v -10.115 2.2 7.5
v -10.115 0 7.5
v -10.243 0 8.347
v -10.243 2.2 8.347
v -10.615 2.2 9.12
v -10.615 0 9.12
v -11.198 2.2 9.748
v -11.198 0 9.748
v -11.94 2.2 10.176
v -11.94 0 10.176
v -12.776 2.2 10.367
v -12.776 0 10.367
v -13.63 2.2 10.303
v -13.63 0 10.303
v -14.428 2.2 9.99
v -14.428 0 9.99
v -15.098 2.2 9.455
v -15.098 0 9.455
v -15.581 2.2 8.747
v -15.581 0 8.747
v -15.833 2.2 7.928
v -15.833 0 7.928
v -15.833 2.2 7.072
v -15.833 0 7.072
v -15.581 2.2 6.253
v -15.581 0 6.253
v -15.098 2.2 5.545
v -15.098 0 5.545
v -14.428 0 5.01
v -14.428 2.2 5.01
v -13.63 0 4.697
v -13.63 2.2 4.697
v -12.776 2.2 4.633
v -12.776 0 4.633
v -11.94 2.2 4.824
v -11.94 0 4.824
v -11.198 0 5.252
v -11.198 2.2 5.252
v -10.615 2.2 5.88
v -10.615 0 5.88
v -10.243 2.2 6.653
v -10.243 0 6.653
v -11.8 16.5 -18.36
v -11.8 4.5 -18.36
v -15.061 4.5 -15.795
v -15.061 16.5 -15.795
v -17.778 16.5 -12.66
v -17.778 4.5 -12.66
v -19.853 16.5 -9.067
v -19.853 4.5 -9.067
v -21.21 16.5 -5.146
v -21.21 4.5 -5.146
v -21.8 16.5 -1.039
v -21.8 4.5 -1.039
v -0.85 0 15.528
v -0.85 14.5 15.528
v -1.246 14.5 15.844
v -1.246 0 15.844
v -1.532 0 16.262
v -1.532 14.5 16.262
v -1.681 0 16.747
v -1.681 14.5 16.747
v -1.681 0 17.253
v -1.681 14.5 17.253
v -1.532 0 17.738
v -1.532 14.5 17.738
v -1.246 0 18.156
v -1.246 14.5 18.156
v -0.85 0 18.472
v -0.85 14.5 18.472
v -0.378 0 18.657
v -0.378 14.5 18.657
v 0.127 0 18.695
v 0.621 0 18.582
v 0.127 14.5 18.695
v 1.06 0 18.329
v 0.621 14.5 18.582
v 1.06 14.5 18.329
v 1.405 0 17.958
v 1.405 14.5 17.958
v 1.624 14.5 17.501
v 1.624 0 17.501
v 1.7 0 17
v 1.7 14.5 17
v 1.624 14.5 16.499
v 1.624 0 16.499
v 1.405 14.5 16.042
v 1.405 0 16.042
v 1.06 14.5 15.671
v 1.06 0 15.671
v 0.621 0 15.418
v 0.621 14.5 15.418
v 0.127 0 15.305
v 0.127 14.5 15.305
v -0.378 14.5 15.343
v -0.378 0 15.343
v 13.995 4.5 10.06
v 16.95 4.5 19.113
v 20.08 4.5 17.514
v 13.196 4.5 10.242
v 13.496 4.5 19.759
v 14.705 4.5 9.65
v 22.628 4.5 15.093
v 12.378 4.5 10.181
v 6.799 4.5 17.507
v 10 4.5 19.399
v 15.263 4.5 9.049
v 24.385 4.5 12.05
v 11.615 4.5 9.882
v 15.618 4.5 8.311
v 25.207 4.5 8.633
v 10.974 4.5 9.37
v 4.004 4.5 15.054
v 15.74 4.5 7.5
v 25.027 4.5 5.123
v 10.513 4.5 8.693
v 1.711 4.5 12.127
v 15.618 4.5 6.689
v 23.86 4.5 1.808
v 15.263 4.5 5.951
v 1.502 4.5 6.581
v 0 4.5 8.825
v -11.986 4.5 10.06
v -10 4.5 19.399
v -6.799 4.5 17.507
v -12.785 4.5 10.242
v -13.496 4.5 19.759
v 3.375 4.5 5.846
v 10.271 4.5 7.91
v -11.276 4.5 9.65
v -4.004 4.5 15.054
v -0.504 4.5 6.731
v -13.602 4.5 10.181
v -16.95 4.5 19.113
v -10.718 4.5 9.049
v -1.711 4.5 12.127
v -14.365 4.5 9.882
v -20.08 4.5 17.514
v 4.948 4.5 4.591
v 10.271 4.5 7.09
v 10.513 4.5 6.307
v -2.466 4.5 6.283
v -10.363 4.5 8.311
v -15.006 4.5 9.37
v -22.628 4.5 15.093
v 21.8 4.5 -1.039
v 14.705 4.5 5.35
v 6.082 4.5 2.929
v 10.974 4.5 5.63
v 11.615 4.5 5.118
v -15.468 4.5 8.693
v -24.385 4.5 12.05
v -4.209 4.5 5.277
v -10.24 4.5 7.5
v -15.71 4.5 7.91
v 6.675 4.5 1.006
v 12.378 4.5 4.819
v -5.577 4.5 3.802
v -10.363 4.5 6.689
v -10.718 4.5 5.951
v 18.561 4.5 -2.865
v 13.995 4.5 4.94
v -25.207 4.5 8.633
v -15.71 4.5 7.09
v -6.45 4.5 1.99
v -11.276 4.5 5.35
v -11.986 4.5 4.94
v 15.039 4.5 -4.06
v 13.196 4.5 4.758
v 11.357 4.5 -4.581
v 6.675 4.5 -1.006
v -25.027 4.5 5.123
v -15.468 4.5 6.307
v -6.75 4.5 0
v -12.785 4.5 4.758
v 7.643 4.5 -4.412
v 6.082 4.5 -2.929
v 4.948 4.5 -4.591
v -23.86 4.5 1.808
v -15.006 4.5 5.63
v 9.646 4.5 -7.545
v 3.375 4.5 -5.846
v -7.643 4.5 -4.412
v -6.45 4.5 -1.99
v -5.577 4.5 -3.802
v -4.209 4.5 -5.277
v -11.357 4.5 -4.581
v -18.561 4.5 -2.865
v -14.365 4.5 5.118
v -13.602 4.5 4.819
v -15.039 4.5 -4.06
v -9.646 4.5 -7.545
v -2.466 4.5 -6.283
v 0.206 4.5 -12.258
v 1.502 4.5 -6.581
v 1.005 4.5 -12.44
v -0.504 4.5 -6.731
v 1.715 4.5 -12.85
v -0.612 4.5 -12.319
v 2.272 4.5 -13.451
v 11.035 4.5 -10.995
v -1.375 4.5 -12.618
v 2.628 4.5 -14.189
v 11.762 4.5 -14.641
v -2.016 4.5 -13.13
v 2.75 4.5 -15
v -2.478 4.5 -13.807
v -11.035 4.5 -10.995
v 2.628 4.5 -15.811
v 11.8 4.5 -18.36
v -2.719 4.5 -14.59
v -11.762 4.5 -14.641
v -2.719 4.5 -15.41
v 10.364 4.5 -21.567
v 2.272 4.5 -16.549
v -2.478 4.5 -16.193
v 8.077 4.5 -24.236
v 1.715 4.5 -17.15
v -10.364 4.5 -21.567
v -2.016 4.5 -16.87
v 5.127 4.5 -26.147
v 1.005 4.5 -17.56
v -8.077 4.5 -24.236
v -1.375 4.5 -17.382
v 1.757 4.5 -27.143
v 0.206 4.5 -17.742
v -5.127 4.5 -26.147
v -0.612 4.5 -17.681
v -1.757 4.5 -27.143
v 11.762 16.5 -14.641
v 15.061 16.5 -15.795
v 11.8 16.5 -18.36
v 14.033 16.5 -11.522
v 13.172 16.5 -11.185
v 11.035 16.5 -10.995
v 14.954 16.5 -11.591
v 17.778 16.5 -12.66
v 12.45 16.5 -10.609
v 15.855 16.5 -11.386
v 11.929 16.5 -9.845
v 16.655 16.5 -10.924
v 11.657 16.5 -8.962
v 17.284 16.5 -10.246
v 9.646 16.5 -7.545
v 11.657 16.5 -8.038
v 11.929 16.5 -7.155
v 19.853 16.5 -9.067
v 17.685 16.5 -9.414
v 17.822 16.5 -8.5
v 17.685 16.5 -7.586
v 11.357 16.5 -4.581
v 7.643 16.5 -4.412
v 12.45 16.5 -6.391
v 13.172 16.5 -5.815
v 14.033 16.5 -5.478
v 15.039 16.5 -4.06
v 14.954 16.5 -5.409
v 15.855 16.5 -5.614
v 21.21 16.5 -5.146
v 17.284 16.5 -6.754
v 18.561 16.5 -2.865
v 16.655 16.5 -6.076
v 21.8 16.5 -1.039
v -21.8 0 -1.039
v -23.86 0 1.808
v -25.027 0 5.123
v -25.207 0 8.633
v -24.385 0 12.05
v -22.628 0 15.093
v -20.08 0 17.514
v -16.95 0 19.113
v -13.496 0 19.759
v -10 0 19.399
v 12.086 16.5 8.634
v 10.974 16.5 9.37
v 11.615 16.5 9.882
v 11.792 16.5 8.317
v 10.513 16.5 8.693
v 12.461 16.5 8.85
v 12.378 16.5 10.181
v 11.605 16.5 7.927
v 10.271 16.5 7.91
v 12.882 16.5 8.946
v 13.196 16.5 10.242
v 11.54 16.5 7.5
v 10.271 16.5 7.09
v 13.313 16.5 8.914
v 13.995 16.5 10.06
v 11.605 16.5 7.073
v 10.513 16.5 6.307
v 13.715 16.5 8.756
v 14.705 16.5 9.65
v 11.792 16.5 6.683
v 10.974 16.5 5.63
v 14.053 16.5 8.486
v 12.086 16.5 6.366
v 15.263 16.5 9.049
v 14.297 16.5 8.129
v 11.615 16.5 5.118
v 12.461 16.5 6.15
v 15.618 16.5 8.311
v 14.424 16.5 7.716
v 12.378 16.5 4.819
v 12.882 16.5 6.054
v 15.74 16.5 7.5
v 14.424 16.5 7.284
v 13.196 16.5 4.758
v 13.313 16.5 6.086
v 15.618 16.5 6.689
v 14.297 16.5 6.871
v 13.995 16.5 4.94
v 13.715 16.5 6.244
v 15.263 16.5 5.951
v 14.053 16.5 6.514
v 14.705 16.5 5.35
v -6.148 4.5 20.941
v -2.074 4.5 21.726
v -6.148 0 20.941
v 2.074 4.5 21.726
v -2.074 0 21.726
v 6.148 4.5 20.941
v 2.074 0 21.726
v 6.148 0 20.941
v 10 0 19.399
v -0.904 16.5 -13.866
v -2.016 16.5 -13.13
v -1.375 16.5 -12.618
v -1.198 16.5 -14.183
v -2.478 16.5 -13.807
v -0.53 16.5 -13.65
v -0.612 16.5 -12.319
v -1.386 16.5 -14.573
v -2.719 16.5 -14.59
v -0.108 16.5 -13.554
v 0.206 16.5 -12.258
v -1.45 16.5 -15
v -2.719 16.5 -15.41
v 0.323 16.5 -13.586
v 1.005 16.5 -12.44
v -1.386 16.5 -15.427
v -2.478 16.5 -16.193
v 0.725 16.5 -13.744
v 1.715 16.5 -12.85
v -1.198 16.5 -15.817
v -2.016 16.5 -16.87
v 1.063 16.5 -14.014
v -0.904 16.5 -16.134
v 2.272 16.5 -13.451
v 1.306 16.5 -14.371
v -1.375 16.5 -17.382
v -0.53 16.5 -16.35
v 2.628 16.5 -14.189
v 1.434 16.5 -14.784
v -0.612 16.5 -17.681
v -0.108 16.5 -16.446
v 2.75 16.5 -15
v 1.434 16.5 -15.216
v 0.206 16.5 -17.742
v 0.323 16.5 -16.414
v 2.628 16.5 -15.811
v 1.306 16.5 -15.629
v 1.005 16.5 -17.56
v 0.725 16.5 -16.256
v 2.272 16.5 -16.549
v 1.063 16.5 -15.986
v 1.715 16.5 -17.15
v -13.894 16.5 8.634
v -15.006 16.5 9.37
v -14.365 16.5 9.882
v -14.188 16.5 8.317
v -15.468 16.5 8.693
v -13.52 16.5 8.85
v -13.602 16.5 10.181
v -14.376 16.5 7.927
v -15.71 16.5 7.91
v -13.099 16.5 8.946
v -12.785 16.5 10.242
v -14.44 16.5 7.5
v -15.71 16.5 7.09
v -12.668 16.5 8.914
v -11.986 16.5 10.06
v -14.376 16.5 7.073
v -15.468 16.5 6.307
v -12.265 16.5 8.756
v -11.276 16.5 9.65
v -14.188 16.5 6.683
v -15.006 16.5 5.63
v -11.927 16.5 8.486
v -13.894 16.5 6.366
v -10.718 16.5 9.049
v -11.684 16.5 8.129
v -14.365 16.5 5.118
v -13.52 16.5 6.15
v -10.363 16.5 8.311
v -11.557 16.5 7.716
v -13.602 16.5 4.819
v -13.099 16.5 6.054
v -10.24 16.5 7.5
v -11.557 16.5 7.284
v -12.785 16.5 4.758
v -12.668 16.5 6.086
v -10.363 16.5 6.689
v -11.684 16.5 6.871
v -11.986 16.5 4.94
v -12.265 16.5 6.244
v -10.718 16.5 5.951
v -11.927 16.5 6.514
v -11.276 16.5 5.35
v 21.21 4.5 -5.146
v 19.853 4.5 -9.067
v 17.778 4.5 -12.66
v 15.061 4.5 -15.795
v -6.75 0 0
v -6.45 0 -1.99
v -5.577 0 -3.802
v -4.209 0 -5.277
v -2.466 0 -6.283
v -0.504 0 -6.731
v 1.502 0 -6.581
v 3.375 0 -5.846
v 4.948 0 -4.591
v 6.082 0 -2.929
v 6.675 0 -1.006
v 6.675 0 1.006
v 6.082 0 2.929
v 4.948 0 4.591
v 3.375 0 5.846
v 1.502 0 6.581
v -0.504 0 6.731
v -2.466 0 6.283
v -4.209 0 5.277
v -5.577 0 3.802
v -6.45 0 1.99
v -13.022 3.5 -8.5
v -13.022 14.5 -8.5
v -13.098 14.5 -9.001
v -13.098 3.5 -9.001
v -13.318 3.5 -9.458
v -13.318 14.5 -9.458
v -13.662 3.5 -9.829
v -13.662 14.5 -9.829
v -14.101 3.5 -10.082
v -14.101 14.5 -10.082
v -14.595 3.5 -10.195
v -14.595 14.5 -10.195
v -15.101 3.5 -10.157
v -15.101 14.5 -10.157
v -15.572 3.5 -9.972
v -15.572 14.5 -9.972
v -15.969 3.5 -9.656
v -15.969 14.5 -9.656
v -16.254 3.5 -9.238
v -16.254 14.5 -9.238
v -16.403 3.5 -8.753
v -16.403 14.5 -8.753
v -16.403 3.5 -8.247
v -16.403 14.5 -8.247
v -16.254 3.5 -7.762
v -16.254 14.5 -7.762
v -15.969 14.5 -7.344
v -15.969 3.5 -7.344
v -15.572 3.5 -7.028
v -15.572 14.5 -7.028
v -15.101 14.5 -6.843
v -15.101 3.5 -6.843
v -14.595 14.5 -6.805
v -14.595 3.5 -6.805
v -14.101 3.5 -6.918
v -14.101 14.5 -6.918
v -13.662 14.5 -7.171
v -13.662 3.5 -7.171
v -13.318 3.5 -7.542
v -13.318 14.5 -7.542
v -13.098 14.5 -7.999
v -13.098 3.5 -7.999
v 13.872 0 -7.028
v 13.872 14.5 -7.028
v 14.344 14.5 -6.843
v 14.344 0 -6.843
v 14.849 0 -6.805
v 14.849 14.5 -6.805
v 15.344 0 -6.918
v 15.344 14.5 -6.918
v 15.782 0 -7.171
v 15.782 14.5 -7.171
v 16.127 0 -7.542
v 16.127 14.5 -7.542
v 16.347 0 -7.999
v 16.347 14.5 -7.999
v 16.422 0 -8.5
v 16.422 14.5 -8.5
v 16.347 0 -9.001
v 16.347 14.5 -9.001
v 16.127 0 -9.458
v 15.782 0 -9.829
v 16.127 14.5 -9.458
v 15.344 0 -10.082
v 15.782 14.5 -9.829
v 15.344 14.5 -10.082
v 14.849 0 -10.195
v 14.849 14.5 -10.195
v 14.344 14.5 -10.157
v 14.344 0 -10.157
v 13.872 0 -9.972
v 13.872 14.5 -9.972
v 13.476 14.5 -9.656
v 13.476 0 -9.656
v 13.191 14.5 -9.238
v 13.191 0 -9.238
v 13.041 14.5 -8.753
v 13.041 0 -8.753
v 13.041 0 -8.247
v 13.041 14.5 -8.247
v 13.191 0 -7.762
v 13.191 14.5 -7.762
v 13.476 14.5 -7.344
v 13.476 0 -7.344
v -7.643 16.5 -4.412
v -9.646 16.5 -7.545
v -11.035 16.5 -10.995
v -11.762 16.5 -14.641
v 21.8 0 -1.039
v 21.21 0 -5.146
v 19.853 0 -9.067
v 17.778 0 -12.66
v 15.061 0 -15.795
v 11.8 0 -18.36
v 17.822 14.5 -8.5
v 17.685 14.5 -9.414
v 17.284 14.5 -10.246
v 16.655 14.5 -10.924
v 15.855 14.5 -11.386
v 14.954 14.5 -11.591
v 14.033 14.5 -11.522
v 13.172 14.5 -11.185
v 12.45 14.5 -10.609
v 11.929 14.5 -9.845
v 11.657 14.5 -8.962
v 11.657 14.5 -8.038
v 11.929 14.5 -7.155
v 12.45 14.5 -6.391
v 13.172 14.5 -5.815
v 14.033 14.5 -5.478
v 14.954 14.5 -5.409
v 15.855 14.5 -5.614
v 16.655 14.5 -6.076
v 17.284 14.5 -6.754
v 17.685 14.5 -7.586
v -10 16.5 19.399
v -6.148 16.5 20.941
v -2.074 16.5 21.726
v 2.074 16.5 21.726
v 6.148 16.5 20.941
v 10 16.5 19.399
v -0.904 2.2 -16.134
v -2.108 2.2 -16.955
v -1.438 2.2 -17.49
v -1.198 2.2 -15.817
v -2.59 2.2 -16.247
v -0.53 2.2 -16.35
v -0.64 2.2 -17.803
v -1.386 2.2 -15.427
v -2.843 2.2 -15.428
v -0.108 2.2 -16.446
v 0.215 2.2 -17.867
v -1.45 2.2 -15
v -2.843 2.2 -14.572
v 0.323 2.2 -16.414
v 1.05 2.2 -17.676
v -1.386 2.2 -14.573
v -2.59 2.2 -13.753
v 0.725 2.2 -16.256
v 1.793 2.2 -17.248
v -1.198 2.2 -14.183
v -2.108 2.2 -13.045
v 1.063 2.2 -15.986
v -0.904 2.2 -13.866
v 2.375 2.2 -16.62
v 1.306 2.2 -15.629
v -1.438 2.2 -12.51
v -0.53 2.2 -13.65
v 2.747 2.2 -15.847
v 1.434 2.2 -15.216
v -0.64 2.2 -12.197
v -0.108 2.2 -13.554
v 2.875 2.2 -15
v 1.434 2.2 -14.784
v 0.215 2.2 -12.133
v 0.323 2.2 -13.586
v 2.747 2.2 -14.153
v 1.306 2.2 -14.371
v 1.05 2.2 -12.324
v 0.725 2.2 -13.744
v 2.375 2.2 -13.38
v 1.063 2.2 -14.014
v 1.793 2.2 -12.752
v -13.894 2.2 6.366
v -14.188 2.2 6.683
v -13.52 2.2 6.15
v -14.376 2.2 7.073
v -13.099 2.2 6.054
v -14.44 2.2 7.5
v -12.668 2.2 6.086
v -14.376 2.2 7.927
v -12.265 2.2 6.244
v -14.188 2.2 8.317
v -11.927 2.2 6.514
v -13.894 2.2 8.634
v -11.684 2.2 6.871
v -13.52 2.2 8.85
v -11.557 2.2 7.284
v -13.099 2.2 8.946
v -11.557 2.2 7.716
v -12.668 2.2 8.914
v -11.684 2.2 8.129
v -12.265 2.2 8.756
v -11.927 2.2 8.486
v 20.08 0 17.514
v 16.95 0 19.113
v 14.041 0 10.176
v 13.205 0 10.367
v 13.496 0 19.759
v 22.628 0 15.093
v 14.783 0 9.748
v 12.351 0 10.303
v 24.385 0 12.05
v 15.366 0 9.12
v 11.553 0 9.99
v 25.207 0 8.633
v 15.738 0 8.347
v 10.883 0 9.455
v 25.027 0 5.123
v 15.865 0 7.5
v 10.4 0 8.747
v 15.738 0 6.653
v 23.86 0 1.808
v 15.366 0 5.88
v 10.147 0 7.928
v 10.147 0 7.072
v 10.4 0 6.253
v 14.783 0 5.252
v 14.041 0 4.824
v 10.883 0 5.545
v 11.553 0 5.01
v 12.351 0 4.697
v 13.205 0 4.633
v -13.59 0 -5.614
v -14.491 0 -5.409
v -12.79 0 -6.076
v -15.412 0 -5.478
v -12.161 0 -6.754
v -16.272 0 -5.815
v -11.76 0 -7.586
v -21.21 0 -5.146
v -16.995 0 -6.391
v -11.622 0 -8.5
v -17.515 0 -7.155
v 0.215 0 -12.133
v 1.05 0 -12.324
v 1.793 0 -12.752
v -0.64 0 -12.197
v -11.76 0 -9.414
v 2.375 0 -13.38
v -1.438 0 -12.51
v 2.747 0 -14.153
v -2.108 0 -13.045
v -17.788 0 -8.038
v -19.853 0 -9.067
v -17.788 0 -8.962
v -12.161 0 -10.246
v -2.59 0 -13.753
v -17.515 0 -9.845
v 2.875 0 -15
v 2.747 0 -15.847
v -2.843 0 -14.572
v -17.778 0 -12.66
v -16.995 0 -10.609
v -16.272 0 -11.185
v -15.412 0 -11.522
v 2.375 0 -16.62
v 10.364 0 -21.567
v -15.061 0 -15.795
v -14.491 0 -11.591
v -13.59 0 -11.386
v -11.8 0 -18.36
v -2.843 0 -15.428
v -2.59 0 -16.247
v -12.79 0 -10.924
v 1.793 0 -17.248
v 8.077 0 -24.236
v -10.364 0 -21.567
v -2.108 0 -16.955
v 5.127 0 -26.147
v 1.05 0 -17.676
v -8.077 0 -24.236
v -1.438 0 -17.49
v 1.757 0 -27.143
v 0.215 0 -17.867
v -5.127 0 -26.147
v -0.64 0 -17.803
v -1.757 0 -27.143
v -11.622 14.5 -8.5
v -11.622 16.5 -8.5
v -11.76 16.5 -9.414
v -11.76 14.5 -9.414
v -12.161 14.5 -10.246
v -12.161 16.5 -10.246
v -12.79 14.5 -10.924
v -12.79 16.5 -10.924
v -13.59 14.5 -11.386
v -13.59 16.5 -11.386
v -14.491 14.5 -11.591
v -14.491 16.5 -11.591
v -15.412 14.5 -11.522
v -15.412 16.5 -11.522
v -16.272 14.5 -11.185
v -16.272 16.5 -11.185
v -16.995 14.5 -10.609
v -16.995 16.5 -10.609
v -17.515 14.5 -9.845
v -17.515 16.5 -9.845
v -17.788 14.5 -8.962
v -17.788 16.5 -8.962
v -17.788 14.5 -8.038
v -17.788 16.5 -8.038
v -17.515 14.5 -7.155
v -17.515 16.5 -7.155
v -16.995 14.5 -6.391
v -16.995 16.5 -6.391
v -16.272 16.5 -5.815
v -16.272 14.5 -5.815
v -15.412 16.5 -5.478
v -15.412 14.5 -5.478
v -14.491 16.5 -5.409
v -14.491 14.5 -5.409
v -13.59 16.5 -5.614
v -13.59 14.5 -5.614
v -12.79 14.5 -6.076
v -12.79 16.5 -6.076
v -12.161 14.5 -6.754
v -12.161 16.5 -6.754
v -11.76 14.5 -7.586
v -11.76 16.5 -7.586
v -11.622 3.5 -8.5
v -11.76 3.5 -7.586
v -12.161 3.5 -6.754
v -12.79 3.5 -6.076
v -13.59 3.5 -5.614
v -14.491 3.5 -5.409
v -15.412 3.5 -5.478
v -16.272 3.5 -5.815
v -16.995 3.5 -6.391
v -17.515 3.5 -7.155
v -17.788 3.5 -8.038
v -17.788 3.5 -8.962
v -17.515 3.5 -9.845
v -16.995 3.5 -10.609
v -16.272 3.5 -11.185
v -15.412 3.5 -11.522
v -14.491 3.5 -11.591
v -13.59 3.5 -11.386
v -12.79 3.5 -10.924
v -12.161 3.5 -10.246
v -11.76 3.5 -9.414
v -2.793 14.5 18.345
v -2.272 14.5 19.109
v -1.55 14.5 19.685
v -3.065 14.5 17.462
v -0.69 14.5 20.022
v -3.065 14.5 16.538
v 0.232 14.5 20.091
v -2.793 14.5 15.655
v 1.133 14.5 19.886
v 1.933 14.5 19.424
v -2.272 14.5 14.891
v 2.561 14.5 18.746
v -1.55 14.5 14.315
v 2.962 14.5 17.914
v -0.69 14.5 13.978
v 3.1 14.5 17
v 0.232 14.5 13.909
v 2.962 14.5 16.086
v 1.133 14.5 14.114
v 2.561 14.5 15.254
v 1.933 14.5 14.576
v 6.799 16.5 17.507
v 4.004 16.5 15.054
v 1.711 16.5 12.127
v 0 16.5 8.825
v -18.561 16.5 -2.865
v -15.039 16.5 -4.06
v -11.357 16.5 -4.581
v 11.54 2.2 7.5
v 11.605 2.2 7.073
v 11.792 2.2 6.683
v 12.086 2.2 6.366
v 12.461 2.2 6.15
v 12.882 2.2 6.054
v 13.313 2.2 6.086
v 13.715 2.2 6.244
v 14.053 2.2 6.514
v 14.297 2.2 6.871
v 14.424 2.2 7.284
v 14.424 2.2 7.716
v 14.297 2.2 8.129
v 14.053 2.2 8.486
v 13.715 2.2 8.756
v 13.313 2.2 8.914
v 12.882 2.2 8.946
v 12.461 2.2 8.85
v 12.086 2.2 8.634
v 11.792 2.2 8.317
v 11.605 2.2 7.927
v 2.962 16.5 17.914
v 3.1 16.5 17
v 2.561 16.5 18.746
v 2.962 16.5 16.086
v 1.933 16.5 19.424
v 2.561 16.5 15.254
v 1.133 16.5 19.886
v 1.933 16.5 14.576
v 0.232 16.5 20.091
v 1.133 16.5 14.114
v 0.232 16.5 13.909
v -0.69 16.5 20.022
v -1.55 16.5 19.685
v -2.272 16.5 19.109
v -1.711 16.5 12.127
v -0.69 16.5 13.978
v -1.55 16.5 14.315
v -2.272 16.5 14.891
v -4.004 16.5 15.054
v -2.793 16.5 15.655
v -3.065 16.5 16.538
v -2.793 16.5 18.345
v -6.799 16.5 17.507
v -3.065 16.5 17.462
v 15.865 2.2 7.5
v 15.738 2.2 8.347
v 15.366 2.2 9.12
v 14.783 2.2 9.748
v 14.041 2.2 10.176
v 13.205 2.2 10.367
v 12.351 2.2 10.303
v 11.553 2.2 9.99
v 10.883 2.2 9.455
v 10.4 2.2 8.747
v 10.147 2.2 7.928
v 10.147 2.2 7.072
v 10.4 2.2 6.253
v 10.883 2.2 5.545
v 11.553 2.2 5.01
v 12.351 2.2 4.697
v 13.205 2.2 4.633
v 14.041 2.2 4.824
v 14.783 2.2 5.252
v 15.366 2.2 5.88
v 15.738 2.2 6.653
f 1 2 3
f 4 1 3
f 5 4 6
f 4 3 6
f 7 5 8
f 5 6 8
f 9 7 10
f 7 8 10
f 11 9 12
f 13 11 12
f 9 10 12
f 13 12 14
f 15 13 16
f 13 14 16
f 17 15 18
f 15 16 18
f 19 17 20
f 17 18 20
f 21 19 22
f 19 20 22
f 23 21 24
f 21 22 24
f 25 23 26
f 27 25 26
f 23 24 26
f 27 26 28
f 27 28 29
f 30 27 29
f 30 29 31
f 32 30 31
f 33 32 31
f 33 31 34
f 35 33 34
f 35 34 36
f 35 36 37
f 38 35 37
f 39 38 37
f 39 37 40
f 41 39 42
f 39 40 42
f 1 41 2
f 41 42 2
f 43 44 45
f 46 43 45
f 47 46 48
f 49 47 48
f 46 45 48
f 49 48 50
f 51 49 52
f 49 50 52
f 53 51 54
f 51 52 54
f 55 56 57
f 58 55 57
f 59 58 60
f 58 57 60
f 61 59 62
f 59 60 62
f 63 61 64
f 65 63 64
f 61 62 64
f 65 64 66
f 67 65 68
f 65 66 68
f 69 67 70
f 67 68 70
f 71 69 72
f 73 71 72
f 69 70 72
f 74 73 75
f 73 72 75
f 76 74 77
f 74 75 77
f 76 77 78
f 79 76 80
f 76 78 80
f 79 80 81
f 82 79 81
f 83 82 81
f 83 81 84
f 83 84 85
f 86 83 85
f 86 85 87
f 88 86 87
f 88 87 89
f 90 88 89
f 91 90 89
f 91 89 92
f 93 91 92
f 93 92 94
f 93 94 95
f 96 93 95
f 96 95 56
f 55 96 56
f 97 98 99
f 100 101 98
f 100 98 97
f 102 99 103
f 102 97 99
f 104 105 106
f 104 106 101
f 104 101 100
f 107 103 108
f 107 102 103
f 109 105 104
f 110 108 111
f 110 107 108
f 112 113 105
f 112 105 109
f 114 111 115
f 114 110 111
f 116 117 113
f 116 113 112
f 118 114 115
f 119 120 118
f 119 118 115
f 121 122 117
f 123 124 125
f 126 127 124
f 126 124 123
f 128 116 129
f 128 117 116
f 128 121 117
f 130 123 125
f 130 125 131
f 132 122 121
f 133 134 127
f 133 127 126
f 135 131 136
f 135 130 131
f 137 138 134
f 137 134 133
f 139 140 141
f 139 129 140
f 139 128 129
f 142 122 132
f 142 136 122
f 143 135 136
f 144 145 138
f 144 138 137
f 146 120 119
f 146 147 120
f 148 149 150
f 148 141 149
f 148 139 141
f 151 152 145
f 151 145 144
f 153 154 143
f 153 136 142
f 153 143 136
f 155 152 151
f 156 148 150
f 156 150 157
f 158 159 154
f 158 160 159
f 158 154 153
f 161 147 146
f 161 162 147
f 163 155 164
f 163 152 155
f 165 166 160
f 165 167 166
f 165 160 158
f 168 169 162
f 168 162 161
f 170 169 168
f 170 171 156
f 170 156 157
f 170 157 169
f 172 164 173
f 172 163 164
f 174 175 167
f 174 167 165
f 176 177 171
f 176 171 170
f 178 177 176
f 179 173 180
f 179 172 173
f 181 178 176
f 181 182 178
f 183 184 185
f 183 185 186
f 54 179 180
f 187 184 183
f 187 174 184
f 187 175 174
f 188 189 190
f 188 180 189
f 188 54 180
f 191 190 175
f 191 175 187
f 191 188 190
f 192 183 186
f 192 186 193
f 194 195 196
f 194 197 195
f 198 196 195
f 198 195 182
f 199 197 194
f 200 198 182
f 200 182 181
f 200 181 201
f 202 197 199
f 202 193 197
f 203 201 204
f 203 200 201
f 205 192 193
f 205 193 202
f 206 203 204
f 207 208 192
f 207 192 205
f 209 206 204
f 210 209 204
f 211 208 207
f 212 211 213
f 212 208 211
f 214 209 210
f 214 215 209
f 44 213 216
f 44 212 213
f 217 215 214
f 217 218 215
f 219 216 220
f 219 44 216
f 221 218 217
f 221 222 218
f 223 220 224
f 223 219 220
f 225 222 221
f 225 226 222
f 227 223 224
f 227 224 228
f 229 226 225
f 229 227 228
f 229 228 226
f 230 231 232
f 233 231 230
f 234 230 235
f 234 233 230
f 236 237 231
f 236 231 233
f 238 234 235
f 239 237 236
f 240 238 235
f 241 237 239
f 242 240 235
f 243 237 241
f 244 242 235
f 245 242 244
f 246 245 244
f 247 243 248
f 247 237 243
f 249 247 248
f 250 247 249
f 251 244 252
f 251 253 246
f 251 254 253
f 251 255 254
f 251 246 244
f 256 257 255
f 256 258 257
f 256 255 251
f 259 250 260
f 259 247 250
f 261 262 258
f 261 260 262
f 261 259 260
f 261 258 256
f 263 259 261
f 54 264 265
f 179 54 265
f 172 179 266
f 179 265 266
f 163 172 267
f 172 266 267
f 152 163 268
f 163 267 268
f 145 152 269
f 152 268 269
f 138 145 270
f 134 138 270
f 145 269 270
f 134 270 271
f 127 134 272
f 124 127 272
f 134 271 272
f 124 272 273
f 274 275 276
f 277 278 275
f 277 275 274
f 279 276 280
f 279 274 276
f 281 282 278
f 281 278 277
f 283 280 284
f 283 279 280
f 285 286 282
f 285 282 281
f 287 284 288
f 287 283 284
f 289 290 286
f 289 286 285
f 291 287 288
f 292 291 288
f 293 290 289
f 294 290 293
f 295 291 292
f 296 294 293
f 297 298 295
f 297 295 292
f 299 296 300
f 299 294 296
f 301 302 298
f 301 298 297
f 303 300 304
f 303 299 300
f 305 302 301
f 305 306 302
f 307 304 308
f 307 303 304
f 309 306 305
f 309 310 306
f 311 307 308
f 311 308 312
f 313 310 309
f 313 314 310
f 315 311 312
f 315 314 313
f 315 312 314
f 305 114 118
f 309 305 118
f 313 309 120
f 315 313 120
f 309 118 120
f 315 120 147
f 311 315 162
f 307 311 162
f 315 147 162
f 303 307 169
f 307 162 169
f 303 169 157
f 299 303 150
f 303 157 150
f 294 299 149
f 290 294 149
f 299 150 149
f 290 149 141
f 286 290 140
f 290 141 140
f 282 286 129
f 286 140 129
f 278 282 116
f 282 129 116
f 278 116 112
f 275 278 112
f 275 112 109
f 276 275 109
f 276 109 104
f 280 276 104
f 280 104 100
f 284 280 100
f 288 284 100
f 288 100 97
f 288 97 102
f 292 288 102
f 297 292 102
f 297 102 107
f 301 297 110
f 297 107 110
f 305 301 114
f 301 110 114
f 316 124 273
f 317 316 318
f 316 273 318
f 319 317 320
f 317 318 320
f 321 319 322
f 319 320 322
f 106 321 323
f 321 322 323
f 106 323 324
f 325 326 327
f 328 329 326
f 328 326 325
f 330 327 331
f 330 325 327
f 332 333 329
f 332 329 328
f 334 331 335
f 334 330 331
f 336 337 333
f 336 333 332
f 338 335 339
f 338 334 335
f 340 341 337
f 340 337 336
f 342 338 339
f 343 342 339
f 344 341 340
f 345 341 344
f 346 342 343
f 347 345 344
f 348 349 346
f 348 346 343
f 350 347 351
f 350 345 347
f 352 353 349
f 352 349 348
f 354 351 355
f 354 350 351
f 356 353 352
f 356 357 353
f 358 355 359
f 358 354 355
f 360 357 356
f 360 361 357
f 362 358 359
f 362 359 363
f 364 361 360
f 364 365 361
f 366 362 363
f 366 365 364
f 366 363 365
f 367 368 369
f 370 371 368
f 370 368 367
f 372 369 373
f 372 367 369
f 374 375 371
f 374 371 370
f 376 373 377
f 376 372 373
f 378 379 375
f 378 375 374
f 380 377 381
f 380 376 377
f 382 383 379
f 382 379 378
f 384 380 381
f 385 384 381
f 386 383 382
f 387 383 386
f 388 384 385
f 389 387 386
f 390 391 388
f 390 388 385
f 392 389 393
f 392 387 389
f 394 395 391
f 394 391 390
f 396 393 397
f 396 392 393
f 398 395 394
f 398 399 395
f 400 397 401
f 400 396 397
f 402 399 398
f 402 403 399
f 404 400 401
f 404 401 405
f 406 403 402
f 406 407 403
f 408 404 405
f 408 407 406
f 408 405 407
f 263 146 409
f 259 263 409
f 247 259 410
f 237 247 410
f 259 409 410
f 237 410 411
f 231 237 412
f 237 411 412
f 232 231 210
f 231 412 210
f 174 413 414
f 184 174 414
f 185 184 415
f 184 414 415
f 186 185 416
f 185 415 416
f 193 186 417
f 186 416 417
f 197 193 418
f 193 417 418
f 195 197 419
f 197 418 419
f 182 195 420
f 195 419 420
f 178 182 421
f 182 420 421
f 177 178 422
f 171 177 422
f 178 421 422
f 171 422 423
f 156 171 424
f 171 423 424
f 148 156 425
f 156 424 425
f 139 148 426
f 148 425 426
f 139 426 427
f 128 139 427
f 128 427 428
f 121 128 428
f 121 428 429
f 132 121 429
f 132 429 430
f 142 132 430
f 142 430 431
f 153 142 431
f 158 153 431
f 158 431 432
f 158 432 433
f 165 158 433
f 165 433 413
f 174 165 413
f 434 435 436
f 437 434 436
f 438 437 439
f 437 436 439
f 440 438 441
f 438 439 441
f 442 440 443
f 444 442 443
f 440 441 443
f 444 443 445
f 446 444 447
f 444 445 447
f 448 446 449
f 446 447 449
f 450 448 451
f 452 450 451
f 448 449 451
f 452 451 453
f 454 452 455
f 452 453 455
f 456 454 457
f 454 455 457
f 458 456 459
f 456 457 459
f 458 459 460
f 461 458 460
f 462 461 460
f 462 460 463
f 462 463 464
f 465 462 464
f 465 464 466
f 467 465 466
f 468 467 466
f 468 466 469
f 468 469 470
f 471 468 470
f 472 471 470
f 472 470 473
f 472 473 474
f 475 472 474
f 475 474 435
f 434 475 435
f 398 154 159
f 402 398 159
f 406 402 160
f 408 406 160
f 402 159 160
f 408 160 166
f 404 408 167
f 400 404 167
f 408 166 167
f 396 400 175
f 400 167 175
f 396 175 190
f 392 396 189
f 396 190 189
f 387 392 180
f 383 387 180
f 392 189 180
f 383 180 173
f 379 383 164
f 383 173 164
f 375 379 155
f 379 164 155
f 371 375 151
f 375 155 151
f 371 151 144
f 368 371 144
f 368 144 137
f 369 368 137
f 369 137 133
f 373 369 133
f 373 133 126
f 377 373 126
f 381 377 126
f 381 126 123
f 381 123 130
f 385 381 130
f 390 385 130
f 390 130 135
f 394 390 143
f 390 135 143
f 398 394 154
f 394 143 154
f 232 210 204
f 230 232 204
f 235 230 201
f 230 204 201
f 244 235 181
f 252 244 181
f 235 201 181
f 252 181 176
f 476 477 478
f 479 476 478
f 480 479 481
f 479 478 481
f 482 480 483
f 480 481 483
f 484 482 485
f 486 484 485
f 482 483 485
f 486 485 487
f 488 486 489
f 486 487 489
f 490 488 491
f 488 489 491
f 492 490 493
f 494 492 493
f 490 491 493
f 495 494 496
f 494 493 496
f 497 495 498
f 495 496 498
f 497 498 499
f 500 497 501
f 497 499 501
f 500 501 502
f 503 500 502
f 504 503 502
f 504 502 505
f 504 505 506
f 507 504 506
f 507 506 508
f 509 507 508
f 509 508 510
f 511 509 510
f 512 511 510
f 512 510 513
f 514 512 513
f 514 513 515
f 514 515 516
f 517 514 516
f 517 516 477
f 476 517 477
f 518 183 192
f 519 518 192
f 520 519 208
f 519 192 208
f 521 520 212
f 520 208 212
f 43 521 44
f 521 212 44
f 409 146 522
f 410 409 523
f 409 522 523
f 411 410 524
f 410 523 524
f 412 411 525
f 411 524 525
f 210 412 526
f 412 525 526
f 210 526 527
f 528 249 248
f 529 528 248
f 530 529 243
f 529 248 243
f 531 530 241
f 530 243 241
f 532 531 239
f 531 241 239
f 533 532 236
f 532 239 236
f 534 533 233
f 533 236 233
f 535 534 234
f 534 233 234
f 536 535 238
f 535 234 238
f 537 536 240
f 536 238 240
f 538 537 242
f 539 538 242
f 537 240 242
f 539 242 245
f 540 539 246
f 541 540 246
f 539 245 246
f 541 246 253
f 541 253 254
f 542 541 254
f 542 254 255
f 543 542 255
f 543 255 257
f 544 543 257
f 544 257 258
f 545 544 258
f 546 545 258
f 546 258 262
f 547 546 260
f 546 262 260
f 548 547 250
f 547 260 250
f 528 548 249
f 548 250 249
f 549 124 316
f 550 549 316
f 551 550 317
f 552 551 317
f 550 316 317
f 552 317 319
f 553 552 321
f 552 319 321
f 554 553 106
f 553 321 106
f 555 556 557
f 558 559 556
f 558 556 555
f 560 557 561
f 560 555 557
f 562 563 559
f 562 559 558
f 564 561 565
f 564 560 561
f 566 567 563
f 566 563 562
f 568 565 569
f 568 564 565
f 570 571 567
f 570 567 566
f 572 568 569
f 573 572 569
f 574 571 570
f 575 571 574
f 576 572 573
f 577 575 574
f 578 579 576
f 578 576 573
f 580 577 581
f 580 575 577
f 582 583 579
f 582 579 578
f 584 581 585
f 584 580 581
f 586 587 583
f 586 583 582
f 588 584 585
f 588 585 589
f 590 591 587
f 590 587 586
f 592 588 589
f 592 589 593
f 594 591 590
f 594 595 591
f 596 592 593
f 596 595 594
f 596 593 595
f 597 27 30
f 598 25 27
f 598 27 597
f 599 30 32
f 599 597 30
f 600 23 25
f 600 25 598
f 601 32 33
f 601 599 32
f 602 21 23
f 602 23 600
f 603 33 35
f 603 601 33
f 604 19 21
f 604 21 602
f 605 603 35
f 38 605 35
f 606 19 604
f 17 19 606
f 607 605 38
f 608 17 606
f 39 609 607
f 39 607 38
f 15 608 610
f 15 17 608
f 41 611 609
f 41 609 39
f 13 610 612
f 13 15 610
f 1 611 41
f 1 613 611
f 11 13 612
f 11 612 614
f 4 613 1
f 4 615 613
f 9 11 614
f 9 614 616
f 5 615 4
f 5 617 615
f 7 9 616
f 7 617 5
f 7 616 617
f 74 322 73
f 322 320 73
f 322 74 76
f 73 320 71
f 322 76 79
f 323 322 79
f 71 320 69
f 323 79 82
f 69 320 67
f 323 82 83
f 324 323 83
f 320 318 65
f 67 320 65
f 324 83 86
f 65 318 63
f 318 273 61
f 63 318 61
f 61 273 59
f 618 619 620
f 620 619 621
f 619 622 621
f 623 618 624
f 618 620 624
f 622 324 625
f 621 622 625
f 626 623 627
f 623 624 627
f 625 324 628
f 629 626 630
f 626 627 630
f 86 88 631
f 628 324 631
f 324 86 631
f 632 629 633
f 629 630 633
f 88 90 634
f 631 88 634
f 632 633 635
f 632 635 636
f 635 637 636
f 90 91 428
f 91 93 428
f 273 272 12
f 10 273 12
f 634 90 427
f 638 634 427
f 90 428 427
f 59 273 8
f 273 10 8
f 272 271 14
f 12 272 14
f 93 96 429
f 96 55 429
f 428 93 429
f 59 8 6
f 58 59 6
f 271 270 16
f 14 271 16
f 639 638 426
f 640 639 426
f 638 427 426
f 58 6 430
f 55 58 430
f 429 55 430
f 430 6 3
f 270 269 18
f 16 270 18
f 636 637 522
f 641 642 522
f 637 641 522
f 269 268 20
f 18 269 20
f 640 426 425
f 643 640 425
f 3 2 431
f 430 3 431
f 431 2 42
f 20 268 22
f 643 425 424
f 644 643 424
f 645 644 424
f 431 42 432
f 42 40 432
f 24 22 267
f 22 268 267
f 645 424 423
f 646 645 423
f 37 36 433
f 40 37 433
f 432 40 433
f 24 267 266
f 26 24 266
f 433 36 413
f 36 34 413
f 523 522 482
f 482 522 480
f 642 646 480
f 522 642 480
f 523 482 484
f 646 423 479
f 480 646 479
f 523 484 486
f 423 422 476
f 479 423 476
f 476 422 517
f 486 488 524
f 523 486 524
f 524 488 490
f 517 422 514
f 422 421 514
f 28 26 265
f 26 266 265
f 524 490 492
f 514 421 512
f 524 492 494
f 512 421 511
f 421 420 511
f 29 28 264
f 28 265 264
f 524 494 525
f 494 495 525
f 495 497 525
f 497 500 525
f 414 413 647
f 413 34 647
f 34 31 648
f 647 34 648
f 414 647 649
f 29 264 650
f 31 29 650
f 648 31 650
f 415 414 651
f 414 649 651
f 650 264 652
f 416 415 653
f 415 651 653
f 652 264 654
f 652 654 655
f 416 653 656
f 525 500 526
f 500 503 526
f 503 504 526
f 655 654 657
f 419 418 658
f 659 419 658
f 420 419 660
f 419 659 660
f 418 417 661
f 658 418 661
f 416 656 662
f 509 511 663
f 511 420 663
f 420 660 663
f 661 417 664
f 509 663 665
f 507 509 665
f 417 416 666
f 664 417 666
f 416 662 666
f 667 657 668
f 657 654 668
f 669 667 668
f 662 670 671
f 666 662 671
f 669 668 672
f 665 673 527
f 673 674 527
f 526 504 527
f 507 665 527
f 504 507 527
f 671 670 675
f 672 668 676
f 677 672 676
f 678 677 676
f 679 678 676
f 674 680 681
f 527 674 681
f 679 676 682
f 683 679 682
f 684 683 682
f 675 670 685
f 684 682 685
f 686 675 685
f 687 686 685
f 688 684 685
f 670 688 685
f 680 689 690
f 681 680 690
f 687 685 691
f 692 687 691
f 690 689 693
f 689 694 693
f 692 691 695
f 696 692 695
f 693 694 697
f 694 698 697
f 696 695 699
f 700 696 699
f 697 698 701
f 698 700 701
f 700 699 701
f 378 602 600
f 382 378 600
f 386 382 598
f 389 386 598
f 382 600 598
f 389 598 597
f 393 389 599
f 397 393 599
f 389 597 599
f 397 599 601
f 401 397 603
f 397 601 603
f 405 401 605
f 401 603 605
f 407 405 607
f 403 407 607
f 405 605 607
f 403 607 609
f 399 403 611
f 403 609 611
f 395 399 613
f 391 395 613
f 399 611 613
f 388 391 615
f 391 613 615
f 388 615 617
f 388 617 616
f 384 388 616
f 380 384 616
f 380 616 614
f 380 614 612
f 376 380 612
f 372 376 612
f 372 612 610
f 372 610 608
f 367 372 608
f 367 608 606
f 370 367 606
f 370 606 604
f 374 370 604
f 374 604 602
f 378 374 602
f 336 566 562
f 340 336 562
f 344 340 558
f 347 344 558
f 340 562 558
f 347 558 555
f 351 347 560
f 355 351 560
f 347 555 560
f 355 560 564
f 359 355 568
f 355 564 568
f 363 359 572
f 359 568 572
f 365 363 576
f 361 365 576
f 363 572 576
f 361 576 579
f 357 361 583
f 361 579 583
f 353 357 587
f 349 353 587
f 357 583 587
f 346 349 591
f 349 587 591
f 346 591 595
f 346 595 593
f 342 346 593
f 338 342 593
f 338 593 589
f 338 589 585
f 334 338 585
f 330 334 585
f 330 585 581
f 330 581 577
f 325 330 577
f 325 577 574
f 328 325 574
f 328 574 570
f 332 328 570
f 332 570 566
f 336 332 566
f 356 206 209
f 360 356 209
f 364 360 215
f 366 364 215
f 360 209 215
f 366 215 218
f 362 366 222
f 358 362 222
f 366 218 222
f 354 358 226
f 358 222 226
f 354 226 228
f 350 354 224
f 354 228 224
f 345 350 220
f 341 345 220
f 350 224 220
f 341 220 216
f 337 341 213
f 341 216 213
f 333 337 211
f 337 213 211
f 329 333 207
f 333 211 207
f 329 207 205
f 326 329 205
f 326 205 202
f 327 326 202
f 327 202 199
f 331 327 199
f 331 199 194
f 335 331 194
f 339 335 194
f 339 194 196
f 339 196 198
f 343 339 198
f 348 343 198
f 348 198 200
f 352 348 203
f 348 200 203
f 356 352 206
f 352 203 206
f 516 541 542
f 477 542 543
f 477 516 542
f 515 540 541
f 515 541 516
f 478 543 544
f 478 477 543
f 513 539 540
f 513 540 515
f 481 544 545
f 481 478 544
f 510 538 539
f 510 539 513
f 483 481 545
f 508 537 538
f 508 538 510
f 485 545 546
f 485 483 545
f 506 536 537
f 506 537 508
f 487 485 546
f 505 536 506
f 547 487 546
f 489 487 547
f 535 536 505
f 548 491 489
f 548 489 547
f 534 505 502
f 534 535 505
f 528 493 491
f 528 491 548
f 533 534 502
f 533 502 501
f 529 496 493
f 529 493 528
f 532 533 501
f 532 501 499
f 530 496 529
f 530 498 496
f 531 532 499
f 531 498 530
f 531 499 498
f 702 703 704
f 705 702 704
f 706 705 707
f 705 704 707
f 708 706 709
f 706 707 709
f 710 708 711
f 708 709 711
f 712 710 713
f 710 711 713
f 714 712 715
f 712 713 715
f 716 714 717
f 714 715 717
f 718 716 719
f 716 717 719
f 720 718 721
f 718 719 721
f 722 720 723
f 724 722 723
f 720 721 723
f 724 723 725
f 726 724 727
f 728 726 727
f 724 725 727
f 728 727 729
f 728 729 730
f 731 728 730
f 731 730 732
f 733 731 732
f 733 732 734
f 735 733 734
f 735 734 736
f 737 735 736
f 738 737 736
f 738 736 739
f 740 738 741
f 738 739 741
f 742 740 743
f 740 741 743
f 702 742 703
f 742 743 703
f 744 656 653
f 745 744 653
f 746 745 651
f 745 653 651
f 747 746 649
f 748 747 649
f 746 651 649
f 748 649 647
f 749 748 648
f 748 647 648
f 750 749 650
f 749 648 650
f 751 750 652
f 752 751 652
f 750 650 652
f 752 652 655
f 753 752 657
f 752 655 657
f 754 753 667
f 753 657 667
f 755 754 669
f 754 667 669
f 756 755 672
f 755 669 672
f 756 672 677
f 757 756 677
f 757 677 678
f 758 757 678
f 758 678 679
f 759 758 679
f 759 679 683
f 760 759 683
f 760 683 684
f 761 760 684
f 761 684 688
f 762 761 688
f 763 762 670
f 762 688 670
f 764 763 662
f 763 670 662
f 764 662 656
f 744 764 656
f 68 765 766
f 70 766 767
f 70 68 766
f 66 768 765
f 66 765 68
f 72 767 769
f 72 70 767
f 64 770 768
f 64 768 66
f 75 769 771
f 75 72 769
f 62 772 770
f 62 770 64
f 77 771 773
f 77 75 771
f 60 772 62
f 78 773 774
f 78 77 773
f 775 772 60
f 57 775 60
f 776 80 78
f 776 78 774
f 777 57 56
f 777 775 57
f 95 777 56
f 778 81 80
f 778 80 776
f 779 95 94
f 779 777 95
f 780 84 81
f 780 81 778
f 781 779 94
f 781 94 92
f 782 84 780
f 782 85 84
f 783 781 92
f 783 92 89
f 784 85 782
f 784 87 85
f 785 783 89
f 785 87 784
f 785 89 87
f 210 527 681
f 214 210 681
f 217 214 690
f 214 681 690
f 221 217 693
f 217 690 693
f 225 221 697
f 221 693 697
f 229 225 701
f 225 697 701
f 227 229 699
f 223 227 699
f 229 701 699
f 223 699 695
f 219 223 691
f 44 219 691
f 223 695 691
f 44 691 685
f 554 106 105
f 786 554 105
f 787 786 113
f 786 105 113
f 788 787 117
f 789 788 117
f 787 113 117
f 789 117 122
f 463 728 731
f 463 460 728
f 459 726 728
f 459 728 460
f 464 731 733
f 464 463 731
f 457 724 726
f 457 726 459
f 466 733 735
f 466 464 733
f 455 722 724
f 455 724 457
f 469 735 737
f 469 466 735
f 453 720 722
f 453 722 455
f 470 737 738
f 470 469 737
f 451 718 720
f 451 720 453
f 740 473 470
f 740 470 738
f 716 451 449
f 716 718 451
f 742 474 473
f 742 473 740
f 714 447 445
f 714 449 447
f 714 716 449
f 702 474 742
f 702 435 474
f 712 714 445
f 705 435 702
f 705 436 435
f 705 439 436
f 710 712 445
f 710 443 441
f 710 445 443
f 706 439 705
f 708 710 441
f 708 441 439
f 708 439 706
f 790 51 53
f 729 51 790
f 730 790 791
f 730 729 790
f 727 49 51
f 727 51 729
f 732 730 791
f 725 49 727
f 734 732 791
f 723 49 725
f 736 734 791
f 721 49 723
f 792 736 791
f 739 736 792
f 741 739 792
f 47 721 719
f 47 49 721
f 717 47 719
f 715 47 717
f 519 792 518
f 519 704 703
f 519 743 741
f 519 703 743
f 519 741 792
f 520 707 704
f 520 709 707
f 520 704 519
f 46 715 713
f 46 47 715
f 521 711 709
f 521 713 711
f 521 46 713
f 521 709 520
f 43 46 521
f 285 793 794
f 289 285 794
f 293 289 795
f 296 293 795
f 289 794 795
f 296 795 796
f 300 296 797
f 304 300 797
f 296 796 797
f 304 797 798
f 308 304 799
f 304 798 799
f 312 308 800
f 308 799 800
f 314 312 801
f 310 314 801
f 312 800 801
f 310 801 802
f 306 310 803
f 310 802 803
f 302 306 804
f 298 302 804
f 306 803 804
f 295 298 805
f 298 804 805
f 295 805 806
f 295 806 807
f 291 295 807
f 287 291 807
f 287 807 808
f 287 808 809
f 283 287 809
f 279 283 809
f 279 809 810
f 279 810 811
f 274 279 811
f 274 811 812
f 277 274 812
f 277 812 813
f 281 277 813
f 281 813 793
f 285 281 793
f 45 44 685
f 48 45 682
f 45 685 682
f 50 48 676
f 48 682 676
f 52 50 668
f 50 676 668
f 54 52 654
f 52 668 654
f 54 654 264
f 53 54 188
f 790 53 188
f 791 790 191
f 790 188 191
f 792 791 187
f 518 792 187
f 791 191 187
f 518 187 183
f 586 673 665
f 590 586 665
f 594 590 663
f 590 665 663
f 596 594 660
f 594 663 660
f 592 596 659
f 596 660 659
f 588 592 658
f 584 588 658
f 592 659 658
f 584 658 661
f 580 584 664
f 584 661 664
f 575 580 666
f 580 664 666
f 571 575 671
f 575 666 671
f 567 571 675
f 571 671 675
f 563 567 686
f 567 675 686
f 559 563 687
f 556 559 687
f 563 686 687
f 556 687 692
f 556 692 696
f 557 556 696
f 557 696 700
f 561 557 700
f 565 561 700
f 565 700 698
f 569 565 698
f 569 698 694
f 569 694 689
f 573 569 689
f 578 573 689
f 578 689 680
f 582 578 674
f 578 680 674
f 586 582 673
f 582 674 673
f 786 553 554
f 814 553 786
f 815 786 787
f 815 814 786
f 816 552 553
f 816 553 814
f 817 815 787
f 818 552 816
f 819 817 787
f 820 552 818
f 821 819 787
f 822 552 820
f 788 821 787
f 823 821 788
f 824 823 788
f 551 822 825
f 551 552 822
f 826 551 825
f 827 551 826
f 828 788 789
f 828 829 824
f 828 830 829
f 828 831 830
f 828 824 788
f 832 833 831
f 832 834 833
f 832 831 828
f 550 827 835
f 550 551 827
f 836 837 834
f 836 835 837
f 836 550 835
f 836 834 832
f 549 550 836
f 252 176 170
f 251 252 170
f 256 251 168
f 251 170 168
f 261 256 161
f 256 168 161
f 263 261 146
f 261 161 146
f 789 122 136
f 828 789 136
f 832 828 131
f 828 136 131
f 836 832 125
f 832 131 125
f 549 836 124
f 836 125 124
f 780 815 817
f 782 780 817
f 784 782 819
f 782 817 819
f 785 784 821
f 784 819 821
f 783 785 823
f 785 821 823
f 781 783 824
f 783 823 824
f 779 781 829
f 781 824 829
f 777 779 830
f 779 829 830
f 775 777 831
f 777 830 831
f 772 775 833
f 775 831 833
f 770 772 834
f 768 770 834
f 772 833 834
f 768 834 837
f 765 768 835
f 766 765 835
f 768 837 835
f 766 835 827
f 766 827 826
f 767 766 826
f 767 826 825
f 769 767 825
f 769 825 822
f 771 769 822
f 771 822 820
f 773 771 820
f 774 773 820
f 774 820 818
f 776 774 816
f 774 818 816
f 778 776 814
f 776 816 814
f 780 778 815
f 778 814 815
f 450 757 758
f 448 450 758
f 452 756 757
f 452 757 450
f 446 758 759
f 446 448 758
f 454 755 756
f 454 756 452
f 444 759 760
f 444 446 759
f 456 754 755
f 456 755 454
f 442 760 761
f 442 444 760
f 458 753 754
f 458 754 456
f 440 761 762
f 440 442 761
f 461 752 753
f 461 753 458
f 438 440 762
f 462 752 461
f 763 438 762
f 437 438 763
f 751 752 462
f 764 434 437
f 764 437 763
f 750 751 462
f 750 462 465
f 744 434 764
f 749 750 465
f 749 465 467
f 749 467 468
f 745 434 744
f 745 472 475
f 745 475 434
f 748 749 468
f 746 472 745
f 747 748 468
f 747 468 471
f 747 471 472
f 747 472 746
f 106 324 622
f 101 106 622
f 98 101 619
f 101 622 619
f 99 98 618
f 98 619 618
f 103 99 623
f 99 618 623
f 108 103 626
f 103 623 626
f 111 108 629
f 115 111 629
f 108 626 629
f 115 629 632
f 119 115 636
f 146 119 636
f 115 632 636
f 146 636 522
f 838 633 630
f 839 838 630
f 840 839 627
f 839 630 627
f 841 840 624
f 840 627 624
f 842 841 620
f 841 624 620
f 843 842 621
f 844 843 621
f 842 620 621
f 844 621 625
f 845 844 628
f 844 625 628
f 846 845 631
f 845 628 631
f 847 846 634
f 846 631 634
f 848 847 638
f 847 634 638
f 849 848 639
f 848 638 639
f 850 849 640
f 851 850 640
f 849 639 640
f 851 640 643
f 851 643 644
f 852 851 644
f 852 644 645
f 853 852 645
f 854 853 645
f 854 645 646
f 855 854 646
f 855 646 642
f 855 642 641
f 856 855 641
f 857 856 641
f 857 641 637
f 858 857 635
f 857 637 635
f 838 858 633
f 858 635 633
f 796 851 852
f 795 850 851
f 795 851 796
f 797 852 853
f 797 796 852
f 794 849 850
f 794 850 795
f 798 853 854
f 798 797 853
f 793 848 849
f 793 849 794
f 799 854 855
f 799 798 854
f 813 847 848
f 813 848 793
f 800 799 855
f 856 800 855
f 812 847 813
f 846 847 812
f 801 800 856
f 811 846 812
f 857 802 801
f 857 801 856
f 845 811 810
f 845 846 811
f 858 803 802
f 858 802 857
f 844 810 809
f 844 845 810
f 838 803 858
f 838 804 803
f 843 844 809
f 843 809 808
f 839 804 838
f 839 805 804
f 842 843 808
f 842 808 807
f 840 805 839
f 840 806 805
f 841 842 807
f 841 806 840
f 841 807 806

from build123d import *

# Parameters (mm, degrees)
CROQUIS1_R                     = 21.825
SALIENTE_EXTRUIR1_DEPTH        = 4.5
CROQUIS2_R                     = 2.75
SALIENTE_EXTRUIR2_DEPTH        = 12
TALADRO_DE_MARGEN_PARA_M121_D  = 13.5
SALIENTE_EXTRUIR3_DEPTH        = 12
CROQUIS8_R                     = 1.7
CORTAR_EXTRUIR1_DEPTH          = 16.5
MATRIZC1_COUNT                 = 3
TALADRO_DE_MARGEN_PARA_M2_51_D = 2.9
SALIENTE_EXTRUIR5_DEPTH        = 4.5
MATRIZC2_COUNT                 = 3
CROQUIS12_R                    = 2.875
CORTAR_EXTRUIR2_DEPTH          = 2.2
CROQUIS13_R                    = 3.1
CORTAR_EXTRUIR3_DEPTH          = 2
CROQUIS14_R                    = 3.1
CORTAR_EXTRUIR4_DEPTH          = 3.5


with BuildPart() as part:
    # Croquis1 → Saliente-Extruir1 (new body)
    with BuildSketch(Plane(origin=(0, 0, 0), x_dir=(1, 0, 0), z_dir=(0, 1, 0))):
        Circle(CROQUIS1_R)
    extrude(amount=SALIENTE_EXTRUIR1_DEPTH)

    # Croquis2 → Saliente-Extruir2 (add)
    with BuildSketch(Plane(origin=(0, 4.5, 0), x_dir=(1, 0, 0), z_dir=(0, 1, 0))):
        with Locations((0, 15)):
            Circle(CROQUIS2_R)
        with Locations((12.990381057, -7.5)):
            Circle(CROQUIS2_R)
        with Locations((-12.990381057, -7.5)):
            Circle(CROQUIS2_R)
    extrude(amount=SALIENTE_EXTRUIR2_DEPTH)

    # Taladro de margen para M121 (through all)
    with Locations(Plane(origin=(0, 4.5, 0), x_dir=(1, 0, 0), z_dir=(0, 1, 0))):
        with Locations((0, 0)):
            Hole(TALADRO_DE_MARGEN_PARA_M121_D / 2)

    # Croquis5 → Saliente-Extruir3 (add)
    with BuildSketch(Plane(origin=(0, 4.5, 0), x_dir=(1, 0, 0), z_dir=(0, 1, 0))):
        with BuildLine():
            ThreePointArc((-7.642674188, 4.4125), (-11.035446071, 10.994501306), (-11.800237164, 18.359875487))
            ThreePointArc((-11.800237164, 18.359875487), (-18.901004438, 10.9125), (-21.800237164, 1.039367411))
            ThreePointArc((-21.800237164, 1.039367411), (-15.039240468, 4.059725986), (-7.642674188, 4.4125))
        make_face()
    saliente_extruir3 = extrude(amount=SALIENTE_EXTRUIR3_DEPTH)

    # Croquis8 → Cortar-Extruir1 (cut)
    with BuildSketch(Plane(origin=(0, 16.5, 0), x_dir=(1, 0, 0), z_dir=(0, 1, 0))):
        with Locations((-14.722431864, 8.5)):
            Circle(CROQUIS8_R)
    cortar_extruir1 = extrude(amount=-CORTAR_EXTRUIR1_DEPTH, mode=Mode.SUBTRACT)

    # MatrizC1: Saliente-Extruir3, Cortar-Extruir1 ×3 about axis
    matrizc1_axis = Axis((0, 0, 0), (0, 1, 0))
    for i in range(1, MATRIZC1_COUNT):
        add(saliente_extruir3.rotate(matrizc1_axis, i * 360 / MATRIZC1_COUNT))
        add(cortar_extruir1.rotate(matrizc1_axis, i * 360 / MATRIZC1_COUNT), mode=Mode.SUBTRACT)

    # Taladro de margen para M2.51 (through all)
    with Locations(Plane(origin=(0, 16.5, 0), x_dir=(1, 0, 0), z_dir=(0, 1, 0))):
        with Locations((12.990381057, -7.5), (-12.990381057, -7.5), (0, 15)):
            Hole(TALADRO_DE_MARGEN_PARA_M2_51_D / 2)

    # Croquis11 → Saliente-Extruir5 (add)
    with BuildSketch(Plane.XZ):
        with BuildLine():
            ThreePointArc((-10, 19.399242898), (-18.901004438, 10.9125), (-21.800237164, -1.039367411))
            ThreePointArc((-21.800237164, -1.039367411), (-23.615858472, 13.634622246), (-10, 19.399242898))
        make_face()
    saliente_extruir5 = extrude(amount=-SALIENTE_EXTRUIR5_DEPTH)

    # MatrizC2: Saliente-Extruir5 ×3 about axis
    matrizc2_axis = Axis((0, 0, 0), (0, 1, 0))
    for i in range(1, MATRIZC2_COUNT):
        add(saliente_extruir5.rotate(matrizc2_axis, i * 360 / MATRIZC2_COUNT))

    # Croquis12 → Cortar-Extruir2 (cut)
    with BuildSketch(Plane.XZ):
        with Locations((-12.990381057, 7.5)):
            Circle(CROQUIS12_R)
        with Locations((12.990381057, 7.5)):
            Circle(CROQUIS12_R)
        with Locations((0, -15)):
            Circle(CROQUIS12_R)
    extrude(amount=-CORTAR_EXTRUIR2_DEPTH, mode=Mode.SUBTRACT)

    # Croquis13 → Cortar-Extruir3 (cut)
    with BuildSketch(Plane(origin=(0, 16.5, 0), x_dir=(1, 0, 0), z_dir=(0, 1, 0))):
        with Locations((0, -17)):
            Circle(CROQUIS13_R)
        with Locations((-14.722431864, 8.5)):
            Circle(CROQUIS13_R)
        with Locations((14.722431864, 8.5)):
            Circle(CROQUIS13_R)
    extrude(amount=-CORTAR_EXTRUIR3_DEPTH, mode=Mode.SUBTRACT)

    # Croquis14 → Cortar-Extruir4 (cut)
    with BuildSketch(Plane.XZ):
        with Locations((-14.722431864, -8.5)):
            Circle(CROQUIS14_R)
    extrude(amount=-CORTAR_EXTRUIR4_DEPTH, mode=Mode.SUBTRACT)


solid = part.part
